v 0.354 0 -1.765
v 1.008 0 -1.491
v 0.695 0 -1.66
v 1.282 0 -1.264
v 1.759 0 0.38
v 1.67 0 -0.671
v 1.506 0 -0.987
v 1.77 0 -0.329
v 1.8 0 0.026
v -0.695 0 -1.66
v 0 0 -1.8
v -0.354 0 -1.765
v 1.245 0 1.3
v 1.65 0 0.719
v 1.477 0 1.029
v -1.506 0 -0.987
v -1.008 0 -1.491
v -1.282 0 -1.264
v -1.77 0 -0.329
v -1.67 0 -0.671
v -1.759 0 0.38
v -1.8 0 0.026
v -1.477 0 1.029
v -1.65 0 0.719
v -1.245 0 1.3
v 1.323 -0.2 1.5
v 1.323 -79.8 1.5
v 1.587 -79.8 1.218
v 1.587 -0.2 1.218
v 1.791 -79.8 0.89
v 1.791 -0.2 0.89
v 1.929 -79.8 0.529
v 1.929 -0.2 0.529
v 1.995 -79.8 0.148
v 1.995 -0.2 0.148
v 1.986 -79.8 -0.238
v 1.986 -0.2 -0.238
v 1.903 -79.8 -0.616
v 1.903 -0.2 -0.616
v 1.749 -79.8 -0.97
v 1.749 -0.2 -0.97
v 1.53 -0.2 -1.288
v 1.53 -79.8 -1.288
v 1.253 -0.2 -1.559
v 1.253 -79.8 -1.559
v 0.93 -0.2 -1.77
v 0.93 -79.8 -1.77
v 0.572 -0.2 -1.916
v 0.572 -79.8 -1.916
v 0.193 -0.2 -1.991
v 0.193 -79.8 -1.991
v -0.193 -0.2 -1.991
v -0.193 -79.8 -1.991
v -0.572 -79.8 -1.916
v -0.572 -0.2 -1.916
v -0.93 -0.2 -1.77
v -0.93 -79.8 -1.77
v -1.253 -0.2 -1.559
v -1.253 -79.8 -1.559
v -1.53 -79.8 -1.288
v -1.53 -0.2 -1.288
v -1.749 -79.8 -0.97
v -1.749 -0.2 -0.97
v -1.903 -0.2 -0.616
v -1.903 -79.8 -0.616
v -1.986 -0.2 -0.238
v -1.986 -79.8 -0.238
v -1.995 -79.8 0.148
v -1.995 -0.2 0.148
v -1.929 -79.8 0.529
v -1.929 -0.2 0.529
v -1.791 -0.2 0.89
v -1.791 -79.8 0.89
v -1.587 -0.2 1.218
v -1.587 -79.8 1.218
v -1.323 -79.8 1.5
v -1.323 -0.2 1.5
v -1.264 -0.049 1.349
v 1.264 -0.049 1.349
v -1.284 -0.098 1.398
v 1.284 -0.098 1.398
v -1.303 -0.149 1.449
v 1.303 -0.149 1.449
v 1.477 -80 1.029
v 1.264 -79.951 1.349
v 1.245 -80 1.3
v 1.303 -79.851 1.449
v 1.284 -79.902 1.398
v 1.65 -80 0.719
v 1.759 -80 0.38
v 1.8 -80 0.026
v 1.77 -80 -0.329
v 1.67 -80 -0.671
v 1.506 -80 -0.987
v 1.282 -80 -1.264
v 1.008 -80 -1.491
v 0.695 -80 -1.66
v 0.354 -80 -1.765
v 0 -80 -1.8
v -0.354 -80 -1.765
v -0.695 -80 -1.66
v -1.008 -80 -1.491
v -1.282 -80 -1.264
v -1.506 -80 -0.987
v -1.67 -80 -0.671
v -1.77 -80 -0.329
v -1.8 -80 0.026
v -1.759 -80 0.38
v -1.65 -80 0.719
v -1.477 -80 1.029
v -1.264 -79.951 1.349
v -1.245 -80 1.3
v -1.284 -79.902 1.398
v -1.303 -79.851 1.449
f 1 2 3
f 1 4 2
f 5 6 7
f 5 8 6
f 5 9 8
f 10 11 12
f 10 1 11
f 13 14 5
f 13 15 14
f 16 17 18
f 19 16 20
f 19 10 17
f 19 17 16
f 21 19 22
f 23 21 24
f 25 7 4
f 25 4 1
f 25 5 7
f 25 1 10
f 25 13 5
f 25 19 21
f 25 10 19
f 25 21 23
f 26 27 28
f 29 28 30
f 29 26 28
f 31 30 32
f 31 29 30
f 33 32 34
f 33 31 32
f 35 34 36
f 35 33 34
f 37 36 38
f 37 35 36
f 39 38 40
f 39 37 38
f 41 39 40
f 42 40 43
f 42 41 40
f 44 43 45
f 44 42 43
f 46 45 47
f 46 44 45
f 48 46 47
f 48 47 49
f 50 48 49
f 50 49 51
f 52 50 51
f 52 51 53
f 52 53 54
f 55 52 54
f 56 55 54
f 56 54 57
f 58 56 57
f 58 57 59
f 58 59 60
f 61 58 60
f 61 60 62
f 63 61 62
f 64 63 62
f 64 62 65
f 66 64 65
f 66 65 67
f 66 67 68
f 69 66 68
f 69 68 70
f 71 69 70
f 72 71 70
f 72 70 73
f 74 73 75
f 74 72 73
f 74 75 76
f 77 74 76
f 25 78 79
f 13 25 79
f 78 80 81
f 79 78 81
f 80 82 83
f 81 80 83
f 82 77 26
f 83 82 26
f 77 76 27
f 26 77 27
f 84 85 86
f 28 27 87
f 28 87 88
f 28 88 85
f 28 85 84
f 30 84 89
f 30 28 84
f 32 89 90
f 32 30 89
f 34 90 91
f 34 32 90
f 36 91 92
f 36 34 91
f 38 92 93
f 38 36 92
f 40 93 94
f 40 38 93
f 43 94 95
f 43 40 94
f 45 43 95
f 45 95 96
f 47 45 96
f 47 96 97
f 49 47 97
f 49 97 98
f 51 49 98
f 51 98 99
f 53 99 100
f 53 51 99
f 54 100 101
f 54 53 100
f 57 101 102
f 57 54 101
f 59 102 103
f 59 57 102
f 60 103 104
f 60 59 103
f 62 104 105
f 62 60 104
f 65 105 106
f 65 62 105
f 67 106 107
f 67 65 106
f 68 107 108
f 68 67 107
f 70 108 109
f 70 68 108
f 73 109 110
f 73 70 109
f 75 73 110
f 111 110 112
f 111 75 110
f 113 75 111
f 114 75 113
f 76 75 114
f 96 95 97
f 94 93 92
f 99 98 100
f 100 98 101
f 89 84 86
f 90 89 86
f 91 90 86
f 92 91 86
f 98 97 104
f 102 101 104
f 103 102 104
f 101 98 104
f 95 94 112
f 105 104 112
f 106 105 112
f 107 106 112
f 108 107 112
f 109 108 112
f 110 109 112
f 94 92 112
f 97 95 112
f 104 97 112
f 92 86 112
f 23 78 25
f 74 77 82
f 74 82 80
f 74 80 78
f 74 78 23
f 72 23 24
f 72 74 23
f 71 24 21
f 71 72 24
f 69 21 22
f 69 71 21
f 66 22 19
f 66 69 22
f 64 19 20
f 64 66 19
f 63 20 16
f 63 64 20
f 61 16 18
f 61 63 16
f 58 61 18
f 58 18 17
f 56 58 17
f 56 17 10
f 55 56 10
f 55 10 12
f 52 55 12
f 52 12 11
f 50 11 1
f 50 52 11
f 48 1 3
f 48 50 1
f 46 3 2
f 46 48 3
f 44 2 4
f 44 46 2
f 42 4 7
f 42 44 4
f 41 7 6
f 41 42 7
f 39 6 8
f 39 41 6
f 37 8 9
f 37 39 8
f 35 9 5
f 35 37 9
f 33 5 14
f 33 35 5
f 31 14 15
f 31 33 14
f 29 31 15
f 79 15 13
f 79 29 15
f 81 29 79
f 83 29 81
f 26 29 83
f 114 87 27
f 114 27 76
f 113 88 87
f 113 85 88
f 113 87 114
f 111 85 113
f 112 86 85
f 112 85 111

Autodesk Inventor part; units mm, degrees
ref_plane "YZ Plane" through (0, 0, 0) normal (1, 0, 0) x (0, 1, 0)
ref_plane "XZ Plane" through (0, 0, 0) normal (0, 1, 0) x (-1, 0, 0)
ref_plane "XY Plane" through (0, 0, 0) normal (0, 0, 1) x (1, 0, 0)
sketch "Sketch1" plane through (0, 0, 0) normal (0, 1, 0) x (-1, 0, 0)
  circle A0 centre (0, 0) radius 2
  dimension "d0" = 4
extrude "Extrusion1" add sketch "Sketch1" against normal blind 80
sketch "Sketch2" plane through (0, -80, 0) normal (0, -1, 0) x (1, 0, 0)
  circle A0 centre (0, 0) radius 2 projected
  line L0 (-1.3229, 1.5) -> (1.3229, 1.5)
  circle A1 centre (0, 0) radius 2 projected
  dimension "d3" = 0.5
extrude "Extrusion2" cut sketch "Sketch2" against normal through all contours L0 A0 picked at (-0.3089, 1.5908)
chamfer "Chamfer1" distance 0.2 angle 45 4 edges at (0, -80, -2) (0, -80, 1.5) (0, 0, -2) (0, 0, 1.5)
properties part number "10-0080" material "Aluminum 6061"
